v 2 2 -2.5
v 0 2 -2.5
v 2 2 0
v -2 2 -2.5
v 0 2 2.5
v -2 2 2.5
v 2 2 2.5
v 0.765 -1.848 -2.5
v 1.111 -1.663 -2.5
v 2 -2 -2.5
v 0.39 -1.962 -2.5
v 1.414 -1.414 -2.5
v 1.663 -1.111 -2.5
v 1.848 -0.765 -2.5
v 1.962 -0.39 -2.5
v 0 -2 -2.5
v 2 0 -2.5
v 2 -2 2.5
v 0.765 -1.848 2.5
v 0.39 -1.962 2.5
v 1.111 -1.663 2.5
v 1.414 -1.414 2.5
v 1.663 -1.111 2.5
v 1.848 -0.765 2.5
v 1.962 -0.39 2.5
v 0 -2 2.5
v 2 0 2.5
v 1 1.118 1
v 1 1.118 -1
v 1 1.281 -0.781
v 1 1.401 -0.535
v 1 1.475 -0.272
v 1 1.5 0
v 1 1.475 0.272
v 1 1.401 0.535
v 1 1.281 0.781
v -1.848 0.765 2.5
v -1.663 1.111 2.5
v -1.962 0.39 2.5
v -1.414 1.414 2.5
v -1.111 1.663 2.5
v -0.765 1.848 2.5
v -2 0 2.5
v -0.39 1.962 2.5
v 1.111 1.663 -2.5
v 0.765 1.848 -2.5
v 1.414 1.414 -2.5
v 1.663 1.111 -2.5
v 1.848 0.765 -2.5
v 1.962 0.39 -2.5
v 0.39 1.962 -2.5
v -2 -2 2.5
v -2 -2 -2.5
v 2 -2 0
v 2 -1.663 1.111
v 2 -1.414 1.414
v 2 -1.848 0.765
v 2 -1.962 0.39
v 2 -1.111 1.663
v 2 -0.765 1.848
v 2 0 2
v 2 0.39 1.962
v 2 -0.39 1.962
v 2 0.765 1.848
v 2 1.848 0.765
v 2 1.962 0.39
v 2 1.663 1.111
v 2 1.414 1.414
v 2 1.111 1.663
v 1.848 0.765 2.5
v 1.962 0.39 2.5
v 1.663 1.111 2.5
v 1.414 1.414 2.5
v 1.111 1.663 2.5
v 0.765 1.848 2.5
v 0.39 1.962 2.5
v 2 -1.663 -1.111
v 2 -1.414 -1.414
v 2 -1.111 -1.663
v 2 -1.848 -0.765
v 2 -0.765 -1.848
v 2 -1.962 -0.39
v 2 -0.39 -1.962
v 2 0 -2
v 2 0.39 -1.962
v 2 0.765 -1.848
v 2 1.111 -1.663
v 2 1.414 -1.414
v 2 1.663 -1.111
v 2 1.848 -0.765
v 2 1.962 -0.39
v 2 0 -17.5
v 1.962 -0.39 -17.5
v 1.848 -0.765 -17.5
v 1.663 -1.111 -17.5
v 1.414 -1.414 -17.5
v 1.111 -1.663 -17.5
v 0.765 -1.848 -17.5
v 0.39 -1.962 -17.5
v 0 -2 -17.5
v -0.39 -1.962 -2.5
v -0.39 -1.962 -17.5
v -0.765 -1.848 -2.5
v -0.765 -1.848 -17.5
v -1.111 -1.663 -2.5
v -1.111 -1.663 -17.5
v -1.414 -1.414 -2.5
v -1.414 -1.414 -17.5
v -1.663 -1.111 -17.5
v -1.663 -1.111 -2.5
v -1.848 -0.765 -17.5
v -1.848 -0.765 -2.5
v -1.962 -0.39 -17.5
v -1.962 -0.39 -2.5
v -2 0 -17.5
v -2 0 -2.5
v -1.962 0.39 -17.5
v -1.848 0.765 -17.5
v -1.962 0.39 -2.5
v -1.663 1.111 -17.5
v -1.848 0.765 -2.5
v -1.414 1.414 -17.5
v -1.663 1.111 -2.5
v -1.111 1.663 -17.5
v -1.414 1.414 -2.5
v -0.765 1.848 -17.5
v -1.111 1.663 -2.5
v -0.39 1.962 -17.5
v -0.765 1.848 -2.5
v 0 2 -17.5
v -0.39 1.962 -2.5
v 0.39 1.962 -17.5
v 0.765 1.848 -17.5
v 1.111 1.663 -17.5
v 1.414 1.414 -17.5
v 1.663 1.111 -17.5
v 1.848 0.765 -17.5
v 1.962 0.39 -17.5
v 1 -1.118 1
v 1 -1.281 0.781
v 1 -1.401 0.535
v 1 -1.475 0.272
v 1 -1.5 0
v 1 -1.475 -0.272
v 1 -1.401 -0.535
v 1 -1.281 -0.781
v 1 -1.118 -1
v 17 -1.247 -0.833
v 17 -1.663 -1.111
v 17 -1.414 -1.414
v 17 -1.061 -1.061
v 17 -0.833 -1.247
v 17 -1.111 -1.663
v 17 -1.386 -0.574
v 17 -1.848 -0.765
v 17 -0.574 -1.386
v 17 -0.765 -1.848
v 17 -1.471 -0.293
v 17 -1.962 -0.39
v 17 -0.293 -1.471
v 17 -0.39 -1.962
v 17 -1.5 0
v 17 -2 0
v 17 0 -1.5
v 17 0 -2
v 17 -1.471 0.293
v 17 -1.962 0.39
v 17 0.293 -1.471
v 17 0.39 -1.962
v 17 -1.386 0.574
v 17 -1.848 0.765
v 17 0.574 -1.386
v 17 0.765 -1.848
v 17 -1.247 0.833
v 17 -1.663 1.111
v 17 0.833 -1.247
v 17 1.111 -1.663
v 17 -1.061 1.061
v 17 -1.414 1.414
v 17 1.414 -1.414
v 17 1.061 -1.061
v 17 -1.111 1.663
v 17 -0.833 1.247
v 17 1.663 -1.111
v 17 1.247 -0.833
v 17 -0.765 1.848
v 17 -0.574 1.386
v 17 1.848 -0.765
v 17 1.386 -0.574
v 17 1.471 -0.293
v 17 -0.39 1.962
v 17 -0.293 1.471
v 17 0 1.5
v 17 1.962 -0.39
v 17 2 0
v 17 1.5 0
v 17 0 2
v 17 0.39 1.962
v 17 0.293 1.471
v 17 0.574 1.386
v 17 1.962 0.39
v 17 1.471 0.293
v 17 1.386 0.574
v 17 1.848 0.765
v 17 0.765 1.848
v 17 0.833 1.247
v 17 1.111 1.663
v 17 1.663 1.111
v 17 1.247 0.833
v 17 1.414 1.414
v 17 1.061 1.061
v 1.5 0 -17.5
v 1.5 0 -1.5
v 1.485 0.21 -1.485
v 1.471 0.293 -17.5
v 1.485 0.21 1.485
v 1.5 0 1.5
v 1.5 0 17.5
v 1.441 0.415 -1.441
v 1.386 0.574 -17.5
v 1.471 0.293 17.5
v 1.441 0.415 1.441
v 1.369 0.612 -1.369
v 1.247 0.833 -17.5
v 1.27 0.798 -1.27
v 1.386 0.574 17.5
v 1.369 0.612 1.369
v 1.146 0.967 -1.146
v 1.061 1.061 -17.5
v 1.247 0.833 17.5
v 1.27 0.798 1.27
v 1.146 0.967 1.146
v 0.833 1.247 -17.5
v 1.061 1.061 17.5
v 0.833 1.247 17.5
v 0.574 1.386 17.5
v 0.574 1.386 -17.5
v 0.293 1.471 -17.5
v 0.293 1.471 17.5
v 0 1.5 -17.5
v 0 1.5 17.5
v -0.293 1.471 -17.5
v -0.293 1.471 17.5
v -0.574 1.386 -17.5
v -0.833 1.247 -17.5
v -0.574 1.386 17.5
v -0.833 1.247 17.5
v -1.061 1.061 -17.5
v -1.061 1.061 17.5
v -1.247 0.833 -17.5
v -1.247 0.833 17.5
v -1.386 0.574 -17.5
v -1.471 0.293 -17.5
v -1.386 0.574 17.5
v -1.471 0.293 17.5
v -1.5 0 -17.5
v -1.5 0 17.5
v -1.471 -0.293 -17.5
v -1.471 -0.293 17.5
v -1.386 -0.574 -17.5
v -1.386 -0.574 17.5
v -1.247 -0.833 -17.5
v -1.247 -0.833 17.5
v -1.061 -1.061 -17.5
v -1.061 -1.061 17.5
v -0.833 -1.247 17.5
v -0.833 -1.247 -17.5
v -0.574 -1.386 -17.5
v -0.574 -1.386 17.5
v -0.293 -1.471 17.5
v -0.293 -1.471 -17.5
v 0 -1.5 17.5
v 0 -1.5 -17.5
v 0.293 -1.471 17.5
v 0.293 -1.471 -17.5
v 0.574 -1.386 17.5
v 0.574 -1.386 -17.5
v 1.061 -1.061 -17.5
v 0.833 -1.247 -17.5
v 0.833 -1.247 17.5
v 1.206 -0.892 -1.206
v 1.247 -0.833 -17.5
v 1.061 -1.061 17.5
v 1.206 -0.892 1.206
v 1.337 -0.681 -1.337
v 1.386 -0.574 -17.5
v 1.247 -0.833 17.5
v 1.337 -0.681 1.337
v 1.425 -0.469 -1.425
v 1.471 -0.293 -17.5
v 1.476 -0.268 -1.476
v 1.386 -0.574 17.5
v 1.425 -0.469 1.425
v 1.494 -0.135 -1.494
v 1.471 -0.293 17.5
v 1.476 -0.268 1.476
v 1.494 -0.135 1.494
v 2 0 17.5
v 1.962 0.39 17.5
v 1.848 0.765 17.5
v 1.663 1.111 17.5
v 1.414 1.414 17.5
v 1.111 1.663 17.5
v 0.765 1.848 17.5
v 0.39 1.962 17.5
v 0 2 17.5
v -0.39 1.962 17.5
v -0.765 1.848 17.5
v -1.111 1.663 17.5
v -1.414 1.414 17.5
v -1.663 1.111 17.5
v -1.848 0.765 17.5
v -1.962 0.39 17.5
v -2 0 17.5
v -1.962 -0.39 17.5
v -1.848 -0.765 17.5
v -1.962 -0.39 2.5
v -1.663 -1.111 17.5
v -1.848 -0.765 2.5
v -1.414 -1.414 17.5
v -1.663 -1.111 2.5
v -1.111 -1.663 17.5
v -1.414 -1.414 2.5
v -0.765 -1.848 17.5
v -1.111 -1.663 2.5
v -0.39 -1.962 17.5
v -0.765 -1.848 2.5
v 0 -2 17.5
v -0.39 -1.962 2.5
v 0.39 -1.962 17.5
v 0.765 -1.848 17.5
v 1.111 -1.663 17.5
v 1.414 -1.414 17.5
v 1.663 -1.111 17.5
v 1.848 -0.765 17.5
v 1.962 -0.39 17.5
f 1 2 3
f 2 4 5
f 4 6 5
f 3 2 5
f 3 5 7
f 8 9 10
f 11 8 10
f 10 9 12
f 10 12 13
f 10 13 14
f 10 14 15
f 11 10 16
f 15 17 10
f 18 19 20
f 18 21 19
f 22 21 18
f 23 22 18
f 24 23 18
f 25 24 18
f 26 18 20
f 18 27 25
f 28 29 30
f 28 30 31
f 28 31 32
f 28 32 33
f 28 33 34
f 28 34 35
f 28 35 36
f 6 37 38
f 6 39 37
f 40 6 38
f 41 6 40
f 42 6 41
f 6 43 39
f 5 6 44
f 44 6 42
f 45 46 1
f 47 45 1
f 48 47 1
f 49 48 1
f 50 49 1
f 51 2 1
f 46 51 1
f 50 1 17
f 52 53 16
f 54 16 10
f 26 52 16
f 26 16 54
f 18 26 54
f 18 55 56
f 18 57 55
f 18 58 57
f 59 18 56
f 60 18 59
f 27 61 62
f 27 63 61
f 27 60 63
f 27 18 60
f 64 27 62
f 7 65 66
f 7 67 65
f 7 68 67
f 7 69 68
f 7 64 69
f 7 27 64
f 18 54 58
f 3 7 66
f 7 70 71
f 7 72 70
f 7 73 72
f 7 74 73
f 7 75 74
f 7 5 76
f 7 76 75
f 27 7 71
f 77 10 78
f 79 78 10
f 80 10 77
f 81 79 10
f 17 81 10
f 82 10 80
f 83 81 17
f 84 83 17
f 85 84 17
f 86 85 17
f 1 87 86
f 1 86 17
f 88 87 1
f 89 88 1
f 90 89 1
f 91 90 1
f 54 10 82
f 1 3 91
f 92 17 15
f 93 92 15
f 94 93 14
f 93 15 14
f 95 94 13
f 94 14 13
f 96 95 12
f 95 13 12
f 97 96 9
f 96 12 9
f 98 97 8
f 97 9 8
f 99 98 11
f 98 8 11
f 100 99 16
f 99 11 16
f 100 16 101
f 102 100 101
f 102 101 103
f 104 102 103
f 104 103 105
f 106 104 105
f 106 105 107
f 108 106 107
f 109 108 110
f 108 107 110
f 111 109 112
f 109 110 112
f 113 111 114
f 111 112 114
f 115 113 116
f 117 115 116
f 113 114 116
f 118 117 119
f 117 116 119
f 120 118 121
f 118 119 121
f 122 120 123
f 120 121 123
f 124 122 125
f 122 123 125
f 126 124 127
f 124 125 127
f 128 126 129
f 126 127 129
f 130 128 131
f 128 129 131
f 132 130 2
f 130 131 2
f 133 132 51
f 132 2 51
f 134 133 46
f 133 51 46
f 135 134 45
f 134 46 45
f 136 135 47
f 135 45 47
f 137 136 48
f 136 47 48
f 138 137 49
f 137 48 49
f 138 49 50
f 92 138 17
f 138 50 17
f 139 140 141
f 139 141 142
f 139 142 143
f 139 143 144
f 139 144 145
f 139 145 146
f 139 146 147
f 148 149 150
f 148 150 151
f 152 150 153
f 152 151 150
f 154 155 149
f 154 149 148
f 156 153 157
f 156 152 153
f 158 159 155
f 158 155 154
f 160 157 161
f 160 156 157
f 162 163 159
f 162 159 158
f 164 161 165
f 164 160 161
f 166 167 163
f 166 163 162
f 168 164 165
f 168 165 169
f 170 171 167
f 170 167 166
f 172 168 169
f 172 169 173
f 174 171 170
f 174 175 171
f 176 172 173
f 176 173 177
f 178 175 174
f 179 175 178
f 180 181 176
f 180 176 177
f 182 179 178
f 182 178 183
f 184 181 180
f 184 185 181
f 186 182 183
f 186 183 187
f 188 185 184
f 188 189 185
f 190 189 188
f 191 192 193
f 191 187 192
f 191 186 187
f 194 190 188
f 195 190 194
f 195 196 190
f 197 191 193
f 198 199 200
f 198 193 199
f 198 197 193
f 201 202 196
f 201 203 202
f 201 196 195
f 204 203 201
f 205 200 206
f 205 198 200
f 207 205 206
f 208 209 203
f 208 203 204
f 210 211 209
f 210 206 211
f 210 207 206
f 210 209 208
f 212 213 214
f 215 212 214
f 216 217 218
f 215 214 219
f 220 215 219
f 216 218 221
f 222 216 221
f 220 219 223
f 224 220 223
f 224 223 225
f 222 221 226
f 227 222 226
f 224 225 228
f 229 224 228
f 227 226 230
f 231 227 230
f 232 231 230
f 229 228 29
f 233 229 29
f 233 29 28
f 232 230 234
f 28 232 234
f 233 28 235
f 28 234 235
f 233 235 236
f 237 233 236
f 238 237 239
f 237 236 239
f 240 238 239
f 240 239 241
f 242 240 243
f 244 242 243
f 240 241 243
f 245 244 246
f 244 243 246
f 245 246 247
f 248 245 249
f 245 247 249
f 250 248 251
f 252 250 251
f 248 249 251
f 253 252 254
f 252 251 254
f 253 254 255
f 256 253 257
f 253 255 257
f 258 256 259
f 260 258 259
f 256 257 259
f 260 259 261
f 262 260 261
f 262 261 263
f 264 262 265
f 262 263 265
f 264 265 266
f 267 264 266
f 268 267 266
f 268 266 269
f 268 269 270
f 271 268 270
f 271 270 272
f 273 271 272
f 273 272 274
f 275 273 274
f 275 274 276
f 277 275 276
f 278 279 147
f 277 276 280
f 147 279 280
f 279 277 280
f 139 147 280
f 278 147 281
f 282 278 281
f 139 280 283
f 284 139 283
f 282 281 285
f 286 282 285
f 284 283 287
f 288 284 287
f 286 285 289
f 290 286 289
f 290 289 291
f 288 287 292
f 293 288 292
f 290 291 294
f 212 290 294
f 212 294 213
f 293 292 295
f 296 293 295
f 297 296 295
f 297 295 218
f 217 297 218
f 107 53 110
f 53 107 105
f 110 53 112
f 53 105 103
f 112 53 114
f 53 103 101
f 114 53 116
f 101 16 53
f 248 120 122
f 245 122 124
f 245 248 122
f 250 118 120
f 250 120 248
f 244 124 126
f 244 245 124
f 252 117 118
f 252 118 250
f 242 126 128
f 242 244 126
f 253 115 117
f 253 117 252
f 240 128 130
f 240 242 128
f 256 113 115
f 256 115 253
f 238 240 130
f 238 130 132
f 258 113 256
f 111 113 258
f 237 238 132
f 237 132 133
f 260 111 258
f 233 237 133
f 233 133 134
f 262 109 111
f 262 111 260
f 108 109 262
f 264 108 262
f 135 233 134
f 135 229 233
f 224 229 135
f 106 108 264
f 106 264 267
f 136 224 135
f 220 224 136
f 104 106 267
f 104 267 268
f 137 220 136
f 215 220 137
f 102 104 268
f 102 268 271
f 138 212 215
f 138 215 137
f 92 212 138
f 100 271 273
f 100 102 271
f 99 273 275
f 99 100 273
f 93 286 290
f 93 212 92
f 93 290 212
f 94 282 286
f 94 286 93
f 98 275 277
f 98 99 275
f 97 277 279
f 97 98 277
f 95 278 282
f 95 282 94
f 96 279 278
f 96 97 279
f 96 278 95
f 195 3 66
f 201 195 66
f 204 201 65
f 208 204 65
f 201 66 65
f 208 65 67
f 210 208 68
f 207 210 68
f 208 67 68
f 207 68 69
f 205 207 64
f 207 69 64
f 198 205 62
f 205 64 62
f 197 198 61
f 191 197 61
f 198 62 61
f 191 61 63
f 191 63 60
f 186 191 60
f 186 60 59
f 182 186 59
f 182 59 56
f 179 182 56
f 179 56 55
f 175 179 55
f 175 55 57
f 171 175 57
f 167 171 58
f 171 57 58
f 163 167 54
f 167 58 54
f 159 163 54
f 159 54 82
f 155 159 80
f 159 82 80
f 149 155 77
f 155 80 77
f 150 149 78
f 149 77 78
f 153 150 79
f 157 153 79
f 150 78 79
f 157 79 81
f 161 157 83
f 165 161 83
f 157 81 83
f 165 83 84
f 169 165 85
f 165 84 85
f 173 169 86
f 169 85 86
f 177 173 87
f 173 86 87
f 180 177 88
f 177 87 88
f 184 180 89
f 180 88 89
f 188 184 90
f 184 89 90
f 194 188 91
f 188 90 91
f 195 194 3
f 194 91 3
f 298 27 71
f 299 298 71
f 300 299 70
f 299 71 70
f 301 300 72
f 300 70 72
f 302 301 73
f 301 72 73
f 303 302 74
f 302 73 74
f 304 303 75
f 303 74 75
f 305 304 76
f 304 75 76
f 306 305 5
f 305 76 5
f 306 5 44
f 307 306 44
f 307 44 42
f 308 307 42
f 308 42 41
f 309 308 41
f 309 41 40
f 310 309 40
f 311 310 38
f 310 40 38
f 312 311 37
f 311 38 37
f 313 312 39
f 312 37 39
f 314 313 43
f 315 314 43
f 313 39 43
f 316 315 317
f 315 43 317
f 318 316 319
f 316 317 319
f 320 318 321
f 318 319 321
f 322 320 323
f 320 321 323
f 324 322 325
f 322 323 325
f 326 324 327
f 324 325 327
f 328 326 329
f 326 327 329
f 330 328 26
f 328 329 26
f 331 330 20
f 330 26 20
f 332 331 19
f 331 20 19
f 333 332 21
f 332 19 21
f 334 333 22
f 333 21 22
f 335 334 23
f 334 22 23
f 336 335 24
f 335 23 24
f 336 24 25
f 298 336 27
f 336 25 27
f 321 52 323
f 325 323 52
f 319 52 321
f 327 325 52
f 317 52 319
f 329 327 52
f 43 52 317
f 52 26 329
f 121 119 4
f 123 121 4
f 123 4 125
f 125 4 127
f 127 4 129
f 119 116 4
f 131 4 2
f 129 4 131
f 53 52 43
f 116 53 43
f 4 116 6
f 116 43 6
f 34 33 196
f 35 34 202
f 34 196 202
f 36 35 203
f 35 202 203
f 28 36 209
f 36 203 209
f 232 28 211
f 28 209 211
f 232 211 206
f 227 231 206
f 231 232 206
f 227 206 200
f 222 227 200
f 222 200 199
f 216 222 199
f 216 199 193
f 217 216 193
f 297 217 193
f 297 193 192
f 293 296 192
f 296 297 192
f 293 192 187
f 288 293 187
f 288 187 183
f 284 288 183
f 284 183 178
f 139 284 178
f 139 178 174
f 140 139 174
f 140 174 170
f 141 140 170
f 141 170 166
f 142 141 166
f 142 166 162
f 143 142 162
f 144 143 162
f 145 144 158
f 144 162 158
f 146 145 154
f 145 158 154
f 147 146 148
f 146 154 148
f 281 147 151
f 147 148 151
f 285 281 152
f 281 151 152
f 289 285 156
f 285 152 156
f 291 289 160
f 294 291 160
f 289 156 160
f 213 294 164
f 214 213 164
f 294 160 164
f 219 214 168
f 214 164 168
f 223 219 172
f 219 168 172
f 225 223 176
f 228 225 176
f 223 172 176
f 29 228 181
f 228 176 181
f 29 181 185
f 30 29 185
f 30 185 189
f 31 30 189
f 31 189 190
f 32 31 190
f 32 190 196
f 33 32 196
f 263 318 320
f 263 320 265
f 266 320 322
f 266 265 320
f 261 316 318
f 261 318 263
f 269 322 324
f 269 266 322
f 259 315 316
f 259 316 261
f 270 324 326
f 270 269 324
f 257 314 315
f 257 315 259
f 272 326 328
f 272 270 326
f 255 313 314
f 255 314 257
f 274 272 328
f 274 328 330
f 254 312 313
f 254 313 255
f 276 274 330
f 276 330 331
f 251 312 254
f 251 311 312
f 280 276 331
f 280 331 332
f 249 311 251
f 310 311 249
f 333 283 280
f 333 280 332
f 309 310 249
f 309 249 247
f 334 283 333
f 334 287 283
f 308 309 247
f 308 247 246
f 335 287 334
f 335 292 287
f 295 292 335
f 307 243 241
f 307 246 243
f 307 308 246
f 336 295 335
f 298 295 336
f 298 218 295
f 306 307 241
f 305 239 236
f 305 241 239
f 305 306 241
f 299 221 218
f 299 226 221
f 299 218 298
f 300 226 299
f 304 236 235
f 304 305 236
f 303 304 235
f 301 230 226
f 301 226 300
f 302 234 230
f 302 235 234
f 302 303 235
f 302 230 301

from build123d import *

# Parameters (mm, degrees)
F1_W      = 4
F1_H      = 4
F2_DEPTH  = 2.5
F3_R      = 2
F4_DEPTH  = 15
F5_R      = 2
F6_DEPTH  = 15
F7_R      = 2
F8_DEPTH  = 15
F9_R      = 1.5
F10_DEPTH = 35.001
F11_R     = 1.5
F12_DEPTH = 16


with BuildPart() as f2:
    # F1 (on Top) → F2 (new body, symmetric)
    with BuildSketch(Plane.XY):
        Rectangle(F1_W, F1_H)
    extrude(amount=F2_DEPTH, both=True)

    # F3 (on face) → F4 (join)
    with BuildSketch(Plane.XY.offset(2.5)):
        Circle(F3_R)
    extrude(amount=F4_DEPTH)

    # F5 (on face) → F6 (join)
    with BuildSketch(Plane(origin=(0, 0, -2.5), x_dir=(1, 0, 0), z_dir=(0, 0, -1))):
        Circle(F5_R)
    extrude(amount=F6_DEPTH)

    # F7 (on face) → F8 (join)
    with BuildSketch(Plane.YZ.offset(2)):
        Circle(F7_R)
    extrude(amount=F8_DEPTH)

    # F9 (on face) → F10 (cut, through all)
    with BuildSketch(Plane.XY.offset(17.5)):
        Circle(F9_R)
    extrude(amount=-F10_DEPTH, mode=Mode.SUBTRACT)

    # F11 (on face) → F12 (cut)
    with BuildSketch(Plane.YZ.offset(17)):
        Circle(F11_R)
    extrude(amount=-F12_DEPTH, mode=Mode.SUBTRACT)


solid = f2.part
